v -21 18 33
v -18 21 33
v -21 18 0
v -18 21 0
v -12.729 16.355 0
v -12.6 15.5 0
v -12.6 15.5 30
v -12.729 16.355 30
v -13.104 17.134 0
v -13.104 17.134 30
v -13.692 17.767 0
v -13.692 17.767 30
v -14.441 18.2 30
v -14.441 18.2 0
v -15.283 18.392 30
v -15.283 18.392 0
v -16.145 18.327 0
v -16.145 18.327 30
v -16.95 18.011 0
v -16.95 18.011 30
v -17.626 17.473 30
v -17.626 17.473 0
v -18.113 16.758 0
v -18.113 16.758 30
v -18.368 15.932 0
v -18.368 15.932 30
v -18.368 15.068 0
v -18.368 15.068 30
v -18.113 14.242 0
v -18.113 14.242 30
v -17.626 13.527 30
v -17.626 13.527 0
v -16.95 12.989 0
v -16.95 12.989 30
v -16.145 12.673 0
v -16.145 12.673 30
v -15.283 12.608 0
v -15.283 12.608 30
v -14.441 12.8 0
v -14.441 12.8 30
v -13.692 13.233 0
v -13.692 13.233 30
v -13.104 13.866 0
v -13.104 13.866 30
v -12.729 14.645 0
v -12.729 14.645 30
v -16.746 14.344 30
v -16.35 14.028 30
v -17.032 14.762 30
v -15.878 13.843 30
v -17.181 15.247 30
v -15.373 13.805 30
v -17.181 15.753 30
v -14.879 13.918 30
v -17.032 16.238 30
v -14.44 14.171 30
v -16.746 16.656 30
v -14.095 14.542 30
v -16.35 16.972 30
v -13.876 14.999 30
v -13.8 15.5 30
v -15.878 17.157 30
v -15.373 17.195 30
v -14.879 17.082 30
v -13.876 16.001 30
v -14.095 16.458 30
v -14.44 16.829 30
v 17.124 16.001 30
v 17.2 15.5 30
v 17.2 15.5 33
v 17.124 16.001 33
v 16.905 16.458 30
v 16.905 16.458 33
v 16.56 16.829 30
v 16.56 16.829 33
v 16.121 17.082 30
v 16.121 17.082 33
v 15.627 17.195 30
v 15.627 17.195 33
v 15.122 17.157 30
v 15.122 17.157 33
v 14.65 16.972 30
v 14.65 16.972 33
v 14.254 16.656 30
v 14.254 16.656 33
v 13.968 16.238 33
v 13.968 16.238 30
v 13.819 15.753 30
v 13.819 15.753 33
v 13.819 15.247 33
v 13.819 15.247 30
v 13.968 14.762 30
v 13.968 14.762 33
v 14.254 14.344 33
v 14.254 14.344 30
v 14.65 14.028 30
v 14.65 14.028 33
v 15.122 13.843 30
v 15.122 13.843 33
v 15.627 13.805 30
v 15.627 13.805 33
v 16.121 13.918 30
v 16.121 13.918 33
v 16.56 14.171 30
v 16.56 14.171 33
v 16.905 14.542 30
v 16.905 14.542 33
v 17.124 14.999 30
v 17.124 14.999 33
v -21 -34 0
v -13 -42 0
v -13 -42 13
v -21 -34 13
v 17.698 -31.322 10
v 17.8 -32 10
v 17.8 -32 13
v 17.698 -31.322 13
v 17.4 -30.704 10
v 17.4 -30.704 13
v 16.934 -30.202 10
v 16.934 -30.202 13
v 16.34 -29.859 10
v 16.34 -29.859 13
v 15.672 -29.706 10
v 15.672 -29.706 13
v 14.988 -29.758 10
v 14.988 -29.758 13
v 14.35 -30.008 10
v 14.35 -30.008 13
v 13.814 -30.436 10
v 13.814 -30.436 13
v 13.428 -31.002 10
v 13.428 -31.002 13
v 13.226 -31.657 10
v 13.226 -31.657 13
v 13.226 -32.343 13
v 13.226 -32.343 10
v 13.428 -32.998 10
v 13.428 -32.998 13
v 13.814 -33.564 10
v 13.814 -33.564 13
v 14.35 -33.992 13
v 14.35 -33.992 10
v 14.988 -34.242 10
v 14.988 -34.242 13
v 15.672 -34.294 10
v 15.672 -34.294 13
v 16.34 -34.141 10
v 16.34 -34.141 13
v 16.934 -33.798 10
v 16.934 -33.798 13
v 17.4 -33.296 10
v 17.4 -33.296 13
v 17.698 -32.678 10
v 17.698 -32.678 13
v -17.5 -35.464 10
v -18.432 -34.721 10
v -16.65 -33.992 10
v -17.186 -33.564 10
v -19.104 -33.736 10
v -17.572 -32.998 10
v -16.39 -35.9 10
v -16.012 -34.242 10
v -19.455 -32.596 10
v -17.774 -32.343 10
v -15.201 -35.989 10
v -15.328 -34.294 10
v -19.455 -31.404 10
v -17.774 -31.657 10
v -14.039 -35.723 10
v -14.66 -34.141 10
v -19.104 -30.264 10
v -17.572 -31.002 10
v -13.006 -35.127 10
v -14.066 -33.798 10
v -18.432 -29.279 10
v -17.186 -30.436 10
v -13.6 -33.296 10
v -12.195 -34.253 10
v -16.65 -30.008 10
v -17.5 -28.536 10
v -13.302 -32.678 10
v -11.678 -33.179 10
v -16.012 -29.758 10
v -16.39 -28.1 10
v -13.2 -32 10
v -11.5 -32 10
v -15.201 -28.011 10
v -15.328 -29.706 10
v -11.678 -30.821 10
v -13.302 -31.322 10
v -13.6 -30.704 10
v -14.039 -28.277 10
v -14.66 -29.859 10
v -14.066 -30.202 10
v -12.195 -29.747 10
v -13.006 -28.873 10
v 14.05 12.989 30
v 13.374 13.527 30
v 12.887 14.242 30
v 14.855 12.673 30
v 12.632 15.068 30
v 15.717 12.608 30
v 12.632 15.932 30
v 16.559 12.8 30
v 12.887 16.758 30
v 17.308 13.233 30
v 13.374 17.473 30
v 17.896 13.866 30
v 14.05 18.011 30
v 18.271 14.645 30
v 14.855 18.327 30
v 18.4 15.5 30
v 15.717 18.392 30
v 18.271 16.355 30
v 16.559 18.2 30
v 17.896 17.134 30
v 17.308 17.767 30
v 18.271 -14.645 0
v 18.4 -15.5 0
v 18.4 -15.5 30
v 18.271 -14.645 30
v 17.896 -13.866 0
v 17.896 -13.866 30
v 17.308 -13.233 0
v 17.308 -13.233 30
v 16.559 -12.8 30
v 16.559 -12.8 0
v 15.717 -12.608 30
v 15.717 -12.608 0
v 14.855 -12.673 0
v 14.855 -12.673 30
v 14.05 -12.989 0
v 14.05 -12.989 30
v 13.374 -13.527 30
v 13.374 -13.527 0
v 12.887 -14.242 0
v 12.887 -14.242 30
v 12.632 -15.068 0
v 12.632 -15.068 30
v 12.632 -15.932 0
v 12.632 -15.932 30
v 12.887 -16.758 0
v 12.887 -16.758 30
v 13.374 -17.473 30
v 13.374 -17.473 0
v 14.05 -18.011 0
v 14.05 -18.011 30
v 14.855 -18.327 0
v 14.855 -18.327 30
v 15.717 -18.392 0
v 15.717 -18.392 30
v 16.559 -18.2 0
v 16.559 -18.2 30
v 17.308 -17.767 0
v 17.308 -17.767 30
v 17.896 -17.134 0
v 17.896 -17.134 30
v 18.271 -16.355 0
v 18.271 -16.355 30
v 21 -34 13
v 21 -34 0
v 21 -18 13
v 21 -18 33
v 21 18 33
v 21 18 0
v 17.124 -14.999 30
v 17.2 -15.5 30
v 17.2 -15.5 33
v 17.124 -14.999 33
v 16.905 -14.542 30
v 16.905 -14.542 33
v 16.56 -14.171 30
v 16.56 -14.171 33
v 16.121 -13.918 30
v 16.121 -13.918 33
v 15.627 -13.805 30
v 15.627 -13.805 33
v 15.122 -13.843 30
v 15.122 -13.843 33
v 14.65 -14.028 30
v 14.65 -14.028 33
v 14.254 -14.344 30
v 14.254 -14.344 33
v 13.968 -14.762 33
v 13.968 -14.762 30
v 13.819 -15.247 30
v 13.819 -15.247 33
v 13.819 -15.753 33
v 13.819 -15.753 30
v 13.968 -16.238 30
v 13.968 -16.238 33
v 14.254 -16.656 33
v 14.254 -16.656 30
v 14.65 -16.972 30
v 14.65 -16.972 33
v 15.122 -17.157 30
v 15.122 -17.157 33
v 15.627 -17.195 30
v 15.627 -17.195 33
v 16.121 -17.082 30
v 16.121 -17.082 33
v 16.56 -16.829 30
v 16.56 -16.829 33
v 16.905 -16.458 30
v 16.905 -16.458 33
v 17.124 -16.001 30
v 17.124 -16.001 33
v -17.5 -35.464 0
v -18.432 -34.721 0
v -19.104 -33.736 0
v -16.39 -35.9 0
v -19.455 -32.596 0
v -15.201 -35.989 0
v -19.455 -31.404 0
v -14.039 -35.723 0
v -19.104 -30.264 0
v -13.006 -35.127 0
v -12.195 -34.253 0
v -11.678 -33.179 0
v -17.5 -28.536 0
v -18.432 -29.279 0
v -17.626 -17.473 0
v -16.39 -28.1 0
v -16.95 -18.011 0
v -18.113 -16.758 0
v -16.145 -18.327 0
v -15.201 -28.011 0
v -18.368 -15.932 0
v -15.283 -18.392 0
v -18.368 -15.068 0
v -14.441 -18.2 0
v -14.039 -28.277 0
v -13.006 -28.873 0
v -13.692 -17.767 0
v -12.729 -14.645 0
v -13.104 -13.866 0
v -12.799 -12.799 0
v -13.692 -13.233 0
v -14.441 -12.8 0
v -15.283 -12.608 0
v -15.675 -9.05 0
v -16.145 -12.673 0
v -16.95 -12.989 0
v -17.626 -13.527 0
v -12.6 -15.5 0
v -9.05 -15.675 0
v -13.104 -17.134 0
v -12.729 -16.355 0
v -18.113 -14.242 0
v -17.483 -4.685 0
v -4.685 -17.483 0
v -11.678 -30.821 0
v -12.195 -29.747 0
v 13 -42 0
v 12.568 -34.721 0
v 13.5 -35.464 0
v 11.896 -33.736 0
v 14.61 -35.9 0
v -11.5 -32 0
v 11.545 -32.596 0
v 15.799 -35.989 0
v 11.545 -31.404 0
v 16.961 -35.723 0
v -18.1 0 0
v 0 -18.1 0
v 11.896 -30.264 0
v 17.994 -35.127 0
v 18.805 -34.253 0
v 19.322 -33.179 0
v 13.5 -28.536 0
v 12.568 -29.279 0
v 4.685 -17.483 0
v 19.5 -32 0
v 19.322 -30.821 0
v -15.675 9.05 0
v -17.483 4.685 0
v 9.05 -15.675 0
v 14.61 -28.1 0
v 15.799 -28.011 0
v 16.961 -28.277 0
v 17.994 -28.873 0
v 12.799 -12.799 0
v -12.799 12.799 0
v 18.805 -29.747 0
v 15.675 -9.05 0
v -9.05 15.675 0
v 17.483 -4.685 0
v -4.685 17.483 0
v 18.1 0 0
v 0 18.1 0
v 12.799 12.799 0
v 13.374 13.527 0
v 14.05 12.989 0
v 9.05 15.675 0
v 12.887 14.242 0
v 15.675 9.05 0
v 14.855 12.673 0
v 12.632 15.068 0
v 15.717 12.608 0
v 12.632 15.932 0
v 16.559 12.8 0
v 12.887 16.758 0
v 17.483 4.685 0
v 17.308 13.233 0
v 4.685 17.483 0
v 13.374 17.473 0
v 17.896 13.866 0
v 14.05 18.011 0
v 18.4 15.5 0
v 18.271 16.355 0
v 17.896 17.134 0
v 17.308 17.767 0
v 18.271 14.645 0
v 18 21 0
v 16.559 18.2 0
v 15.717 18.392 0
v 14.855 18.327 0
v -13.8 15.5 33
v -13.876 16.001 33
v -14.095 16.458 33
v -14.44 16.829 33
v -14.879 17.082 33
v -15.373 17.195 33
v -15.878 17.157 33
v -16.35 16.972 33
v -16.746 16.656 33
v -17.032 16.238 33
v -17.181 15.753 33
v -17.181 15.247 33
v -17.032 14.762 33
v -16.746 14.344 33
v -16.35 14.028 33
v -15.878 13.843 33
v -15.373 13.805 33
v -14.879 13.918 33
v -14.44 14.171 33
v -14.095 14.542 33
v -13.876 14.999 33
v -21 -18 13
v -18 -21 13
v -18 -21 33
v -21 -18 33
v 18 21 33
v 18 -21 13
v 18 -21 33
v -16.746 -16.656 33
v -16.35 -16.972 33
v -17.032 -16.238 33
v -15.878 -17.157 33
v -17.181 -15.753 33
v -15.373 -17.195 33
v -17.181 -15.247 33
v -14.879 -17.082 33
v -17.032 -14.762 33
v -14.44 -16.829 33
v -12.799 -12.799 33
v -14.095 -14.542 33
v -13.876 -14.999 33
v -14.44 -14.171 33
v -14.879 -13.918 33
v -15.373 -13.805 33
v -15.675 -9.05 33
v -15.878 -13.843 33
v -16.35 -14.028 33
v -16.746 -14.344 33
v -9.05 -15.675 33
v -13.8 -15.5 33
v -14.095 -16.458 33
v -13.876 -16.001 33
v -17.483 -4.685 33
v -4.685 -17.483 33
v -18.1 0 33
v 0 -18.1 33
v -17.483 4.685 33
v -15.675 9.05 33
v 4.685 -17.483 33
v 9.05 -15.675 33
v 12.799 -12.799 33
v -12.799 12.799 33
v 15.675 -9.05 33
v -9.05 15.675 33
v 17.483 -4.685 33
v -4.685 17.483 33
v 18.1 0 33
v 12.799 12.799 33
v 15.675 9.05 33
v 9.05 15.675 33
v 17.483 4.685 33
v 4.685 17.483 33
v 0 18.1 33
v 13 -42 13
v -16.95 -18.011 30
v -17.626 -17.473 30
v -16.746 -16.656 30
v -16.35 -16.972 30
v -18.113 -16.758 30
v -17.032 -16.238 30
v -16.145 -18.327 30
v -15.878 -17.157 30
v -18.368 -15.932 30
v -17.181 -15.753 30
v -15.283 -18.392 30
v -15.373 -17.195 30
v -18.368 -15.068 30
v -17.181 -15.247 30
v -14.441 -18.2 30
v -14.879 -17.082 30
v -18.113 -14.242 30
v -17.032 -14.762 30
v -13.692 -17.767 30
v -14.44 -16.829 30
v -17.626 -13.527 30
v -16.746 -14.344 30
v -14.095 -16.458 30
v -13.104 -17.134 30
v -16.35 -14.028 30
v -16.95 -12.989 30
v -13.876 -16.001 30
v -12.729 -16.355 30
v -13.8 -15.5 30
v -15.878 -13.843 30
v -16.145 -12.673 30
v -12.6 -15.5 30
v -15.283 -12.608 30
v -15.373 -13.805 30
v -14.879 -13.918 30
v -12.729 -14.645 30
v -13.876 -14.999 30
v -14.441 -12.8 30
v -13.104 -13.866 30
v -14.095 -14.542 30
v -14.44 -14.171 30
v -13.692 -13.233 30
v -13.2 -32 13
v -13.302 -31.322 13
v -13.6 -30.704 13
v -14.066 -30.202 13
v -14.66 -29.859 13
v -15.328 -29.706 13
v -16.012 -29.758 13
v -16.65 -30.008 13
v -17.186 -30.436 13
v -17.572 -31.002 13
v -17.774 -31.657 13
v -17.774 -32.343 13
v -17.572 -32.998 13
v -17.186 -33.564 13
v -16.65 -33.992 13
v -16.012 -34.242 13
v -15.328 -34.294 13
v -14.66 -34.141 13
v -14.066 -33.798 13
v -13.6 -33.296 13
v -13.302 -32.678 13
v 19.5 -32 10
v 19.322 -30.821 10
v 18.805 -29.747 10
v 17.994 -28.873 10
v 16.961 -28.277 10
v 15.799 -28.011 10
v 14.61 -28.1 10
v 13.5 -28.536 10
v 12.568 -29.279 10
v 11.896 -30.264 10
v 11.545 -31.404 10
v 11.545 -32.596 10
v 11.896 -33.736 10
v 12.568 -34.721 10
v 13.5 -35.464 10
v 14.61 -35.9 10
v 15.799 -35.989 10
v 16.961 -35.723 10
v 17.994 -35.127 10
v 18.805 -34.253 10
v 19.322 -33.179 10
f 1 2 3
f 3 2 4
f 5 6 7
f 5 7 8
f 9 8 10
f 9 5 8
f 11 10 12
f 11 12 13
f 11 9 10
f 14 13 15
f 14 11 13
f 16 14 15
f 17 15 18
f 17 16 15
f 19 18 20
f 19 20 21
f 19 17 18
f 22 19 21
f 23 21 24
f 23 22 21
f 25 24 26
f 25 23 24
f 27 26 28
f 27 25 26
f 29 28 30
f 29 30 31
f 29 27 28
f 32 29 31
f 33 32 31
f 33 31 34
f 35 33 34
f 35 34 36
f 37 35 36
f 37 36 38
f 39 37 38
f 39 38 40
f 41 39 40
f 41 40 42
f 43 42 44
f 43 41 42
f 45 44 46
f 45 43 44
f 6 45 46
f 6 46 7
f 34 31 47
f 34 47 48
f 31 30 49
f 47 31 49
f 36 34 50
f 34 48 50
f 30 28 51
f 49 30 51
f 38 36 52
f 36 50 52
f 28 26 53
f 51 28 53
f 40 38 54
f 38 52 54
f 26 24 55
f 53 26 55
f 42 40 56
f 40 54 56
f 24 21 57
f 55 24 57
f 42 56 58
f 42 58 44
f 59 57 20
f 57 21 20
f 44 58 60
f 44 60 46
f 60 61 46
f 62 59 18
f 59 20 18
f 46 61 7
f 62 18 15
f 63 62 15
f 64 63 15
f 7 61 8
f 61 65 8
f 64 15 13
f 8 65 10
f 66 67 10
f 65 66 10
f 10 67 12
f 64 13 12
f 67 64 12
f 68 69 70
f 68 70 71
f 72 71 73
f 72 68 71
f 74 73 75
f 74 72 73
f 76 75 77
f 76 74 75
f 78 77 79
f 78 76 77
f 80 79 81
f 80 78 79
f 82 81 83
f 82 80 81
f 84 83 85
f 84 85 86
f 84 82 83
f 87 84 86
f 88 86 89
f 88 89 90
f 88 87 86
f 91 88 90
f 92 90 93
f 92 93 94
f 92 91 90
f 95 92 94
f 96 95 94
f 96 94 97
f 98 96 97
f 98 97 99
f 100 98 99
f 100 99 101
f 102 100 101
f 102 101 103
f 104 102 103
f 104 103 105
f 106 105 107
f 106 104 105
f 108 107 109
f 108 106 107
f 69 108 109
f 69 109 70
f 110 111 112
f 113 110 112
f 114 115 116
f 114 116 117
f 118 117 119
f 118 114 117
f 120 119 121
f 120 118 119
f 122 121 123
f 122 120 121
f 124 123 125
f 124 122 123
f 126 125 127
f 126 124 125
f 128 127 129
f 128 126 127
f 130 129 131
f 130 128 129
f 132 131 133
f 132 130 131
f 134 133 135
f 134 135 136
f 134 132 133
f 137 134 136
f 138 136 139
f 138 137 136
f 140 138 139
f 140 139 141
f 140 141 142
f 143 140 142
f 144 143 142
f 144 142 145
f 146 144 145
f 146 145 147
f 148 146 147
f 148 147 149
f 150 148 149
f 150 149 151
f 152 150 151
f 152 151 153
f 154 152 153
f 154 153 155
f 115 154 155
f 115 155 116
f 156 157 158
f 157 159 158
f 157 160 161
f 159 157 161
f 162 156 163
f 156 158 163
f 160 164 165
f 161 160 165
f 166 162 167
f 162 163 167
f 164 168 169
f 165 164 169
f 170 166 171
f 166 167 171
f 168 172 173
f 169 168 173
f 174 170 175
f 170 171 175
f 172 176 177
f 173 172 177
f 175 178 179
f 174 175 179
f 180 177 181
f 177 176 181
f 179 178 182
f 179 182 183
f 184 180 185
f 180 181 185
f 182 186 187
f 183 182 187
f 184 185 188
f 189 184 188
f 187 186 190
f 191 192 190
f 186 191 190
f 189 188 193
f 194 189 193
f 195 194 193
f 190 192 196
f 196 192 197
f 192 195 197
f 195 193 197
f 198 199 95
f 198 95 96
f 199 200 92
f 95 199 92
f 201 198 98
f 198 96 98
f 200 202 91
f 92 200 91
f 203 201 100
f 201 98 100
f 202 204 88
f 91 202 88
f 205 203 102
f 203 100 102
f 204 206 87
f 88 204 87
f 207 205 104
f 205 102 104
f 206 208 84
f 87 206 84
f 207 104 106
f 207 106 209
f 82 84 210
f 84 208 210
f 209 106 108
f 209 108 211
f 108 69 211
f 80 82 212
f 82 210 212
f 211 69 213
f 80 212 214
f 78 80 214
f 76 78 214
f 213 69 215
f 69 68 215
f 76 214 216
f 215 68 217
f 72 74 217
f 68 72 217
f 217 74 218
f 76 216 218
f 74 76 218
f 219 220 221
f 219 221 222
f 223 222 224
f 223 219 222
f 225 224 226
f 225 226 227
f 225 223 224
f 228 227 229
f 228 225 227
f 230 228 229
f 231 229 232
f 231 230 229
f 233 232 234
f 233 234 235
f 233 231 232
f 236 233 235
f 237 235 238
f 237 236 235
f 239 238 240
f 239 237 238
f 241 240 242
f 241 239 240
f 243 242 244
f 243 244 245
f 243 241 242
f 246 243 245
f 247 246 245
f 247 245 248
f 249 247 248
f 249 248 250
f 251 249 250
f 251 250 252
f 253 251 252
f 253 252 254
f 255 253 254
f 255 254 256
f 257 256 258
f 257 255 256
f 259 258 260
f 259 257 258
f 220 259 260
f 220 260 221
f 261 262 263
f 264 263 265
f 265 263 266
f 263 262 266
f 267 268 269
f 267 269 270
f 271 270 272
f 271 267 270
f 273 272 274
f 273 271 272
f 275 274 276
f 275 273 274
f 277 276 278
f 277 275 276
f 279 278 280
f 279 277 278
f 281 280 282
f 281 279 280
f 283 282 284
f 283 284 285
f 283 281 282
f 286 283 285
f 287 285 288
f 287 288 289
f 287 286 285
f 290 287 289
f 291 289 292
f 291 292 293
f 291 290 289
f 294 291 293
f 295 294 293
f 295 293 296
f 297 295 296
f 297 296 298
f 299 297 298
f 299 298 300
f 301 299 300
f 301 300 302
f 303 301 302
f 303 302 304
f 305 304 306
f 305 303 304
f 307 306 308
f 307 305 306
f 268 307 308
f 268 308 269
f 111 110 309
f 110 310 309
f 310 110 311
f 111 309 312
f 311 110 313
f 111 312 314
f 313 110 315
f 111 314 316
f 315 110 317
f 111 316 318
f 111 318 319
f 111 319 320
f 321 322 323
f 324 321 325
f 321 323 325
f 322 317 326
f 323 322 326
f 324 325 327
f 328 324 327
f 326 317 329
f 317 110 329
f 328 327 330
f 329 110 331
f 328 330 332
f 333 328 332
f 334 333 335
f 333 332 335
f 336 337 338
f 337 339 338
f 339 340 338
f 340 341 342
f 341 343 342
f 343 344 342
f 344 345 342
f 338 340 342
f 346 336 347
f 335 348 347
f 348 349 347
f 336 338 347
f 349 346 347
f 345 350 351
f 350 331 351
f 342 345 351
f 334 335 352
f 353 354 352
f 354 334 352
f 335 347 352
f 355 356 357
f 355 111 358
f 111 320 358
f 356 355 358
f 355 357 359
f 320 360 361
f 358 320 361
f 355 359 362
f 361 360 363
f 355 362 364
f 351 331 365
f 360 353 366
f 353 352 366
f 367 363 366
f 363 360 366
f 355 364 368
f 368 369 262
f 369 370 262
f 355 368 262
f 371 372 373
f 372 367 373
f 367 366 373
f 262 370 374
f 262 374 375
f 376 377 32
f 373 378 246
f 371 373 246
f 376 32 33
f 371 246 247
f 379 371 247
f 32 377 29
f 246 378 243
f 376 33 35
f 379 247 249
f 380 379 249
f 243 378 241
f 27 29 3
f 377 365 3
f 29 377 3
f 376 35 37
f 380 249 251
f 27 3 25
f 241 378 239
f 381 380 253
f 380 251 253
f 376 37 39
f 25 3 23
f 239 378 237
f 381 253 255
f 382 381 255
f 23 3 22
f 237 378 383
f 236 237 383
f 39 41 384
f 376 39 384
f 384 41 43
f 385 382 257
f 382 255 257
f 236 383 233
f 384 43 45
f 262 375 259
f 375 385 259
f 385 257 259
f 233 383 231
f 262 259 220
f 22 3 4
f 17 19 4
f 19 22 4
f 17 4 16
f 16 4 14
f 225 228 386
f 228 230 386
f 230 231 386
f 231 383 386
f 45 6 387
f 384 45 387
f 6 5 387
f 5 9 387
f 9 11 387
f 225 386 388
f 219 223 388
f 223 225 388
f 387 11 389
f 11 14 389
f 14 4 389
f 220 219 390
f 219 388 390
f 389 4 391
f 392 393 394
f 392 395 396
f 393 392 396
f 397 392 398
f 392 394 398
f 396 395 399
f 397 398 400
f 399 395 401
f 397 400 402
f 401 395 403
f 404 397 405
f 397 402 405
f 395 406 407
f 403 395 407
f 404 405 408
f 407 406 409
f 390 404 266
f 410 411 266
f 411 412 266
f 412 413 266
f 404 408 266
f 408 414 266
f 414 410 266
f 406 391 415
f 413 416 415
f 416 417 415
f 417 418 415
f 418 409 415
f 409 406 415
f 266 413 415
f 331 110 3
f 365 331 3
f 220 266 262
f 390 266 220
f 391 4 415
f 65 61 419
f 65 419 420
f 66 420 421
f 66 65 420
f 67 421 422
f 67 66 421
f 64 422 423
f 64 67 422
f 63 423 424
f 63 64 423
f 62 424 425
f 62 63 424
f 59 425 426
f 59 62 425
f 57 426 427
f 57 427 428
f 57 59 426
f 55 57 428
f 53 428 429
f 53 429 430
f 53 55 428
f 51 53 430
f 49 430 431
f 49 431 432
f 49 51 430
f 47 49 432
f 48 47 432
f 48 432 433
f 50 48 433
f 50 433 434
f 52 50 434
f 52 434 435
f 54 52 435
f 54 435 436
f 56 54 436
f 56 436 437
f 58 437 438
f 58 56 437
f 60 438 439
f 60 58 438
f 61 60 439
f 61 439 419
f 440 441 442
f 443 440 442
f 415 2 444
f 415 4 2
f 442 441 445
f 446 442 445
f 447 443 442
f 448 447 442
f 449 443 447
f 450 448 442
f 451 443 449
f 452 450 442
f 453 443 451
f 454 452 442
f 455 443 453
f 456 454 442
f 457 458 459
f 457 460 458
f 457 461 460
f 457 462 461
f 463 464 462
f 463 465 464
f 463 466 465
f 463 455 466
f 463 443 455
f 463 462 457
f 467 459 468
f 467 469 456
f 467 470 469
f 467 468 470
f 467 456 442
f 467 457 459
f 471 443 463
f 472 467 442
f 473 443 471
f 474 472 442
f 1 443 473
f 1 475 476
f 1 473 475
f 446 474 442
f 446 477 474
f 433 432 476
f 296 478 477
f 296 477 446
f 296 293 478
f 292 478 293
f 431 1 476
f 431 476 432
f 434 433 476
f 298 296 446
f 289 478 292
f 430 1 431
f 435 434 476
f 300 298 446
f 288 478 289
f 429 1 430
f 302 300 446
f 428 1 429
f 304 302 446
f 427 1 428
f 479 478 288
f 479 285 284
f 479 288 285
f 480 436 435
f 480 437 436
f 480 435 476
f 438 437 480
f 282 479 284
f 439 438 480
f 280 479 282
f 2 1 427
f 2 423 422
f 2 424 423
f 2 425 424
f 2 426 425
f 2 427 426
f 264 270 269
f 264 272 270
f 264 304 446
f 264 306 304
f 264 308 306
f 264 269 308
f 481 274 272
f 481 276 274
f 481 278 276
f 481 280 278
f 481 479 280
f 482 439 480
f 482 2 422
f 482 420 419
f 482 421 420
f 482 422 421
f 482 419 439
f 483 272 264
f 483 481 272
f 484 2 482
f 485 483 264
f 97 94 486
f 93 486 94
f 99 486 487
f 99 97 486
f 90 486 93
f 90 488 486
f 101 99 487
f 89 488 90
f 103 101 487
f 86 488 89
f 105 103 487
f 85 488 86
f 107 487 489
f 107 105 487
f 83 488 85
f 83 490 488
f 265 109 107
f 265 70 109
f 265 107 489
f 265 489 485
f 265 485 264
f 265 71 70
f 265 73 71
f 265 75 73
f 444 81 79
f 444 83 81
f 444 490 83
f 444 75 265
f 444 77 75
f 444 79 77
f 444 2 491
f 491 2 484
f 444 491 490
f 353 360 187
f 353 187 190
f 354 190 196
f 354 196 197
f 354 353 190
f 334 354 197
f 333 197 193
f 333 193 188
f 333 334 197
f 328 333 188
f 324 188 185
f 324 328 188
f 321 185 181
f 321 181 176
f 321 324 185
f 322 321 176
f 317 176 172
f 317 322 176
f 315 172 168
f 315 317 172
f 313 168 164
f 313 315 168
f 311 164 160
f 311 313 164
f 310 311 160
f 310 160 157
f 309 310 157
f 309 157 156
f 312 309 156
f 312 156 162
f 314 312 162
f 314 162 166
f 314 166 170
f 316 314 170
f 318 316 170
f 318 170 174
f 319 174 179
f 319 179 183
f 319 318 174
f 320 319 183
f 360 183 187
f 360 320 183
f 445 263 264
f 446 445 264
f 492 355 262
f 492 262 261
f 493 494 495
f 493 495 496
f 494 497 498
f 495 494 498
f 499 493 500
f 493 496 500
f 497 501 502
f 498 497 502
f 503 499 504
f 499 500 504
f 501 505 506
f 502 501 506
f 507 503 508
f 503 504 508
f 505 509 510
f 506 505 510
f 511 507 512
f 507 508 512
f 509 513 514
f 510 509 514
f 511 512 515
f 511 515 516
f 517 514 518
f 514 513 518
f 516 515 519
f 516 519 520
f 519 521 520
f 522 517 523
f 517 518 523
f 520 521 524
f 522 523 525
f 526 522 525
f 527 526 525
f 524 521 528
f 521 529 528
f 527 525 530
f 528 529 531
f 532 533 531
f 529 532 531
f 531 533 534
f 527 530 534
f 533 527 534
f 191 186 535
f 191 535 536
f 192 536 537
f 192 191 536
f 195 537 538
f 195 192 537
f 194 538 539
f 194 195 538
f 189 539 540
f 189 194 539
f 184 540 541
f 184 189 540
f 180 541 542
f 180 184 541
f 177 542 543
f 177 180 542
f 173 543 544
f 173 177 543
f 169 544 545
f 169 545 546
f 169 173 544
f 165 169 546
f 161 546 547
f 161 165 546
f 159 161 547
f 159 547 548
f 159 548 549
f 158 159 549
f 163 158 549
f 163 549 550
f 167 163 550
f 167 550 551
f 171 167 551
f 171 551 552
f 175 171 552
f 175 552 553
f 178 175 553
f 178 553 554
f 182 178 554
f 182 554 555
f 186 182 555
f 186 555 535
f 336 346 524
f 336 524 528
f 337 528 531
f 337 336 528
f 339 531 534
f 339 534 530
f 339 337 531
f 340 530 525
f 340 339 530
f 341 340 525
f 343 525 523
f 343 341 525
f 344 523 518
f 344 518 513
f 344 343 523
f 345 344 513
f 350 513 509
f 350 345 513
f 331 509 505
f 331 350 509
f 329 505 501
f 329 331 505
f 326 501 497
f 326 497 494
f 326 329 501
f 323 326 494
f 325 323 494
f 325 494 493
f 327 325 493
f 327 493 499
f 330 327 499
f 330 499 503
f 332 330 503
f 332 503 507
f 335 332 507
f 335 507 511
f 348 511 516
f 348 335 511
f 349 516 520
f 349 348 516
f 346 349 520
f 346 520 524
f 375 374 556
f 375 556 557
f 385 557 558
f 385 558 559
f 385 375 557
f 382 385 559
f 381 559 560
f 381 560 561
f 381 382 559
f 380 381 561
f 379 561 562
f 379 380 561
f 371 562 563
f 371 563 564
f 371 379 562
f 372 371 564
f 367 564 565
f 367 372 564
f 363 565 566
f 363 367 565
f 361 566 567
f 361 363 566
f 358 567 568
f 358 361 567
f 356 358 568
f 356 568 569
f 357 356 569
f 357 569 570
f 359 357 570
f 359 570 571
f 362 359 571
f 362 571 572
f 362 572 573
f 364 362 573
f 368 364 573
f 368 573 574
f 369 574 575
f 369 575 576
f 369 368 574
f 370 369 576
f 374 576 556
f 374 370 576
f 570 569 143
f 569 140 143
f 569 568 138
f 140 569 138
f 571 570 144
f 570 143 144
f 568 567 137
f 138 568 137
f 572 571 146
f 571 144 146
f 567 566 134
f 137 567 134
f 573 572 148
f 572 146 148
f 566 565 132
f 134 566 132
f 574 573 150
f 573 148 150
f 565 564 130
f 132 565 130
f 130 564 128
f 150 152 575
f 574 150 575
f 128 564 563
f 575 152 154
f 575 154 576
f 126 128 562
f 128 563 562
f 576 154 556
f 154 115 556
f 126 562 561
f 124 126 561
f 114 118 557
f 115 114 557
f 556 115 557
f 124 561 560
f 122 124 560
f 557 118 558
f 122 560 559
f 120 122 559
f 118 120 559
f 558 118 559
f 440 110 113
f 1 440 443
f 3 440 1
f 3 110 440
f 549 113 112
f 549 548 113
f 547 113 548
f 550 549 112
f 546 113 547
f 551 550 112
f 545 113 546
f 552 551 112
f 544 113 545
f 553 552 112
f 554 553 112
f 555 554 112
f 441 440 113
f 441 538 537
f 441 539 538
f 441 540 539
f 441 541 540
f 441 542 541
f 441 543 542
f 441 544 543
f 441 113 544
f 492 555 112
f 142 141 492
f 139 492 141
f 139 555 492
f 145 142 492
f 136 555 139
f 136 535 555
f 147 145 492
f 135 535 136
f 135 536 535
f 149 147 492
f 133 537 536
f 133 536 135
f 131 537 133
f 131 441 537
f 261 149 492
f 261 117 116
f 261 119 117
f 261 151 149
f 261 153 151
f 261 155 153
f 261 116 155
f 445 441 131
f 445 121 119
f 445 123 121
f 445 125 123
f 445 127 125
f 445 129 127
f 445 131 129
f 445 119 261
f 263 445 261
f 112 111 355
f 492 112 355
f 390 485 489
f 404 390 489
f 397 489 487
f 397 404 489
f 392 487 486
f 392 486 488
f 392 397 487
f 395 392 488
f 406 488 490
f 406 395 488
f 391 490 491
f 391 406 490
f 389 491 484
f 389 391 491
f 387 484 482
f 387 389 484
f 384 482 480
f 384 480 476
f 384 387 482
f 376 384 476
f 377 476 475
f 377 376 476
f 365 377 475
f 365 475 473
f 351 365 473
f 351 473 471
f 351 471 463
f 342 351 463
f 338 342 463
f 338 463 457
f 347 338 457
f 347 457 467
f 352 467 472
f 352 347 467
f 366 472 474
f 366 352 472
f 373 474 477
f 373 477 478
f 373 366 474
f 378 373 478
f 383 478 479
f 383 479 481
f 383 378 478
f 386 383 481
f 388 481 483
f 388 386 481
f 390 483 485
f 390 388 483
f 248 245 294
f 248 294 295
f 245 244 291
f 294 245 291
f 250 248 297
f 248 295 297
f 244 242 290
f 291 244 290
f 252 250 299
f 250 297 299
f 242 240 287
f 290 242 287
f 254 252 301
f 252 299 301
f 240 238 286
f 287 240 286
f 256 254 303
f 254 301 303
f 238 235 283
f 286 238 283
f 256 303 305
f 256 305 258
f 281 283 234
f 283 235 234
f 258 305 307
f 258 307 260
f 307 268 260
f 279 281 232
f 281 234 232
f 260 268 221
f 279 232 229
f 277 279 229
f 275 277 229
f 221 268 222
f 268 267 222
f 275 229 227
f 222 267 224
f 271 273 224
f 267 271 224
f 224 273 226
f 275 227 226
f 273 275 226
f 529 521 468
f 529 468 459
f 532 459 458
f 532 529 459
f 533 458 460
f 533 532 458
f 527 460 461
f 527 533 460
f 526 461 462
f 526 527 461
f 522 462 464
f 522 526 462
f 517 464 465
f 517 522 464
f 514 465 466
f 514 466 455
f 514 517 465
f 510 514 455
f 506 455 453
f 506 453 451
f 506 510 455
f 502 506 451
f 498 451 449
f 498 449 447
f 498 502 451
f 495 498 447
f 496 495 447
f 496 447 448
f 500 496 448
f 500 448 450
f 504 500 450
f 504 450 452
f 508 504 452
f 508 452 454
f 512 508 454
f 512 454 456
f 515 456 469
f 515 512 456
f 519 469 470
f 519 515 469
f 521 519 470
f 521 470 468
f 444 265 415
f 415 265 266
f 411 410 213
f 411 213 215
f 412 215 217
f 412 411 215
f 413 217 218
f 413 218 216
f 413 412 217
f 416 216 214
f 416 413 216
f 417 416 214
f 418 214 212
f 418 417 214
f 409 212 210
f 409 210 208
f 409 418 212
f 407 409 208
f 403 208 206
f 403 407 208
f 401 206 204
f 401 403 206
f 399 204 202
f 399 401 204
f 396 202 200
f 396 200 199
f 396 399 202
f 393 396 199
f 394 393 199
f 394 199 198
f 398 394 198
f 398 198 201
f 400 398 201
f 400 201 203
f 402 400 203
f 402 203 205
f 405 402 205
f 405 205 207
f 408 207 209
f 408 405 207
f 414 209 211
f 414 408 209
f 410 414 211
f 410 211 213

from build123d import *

# Parameters (mm, degrees)
SKIZZE1_W                       = 42
SKIZZE1_H                       = 63
SKIZZE1_R                       = 18.1
SKIZZE1_R_2                     = 1.7
SKIZZE1_R_3                     = 2.3
AUFSATZ_LINEAR_AUSTRAGEN1_DEPTH = 13
SKIZZE2_W                       = 42
SKIZZE2_H                       = 42
SKIZZE2_R                       = 18.1
SKIZZE2_R_2                     = 1.7
AUFSATZ_LINEAR_AUSTRAGEN2_DEPTH = 20
SKIZZE4_R                       = 4
SCHNITT_LINEAR_AUSTRAGEN1_DEPTH = 10
SKIZZE5_R                       = 2.9
SCHNITT_LINEAR_AUSTRAGEN2_DEPTH = 30
FASE1_SIZE                      = 3
FASE2_SIZE                      = 8


with BuildPart() as part:
    # Skizze1 → Aufsatz-Linear austragen1 (new body)
    with BuildSketch(Plane.XY):
        with Locations((0, -10.5)):
            Rectangle(SKIZZE1_W, SKIZZE1_H)
        Circle(SKIZZE1_R, mode=Mode.SUBTRACT)
        with Locations((-15.5, 15.5)):
            Circle(SKIZZE1_R_2, mode=Mode.SUBTRACT)
        with Locations((15.5, 15.5)):
            Circle(SKIZZE1_R_2, mode=Mode.SUBTRACT)
        with Locations((-15.5, -15.5)):
            Circle(SKIZZE1_R_2, mode=Mode.SUBTRACT)
        with Locations((15.5, -15.5)):
            Circle(SKIZZE1_R_2, mode=Mode.SUBTRACT)
        with Locations((-15.5, -32)):
            Circle(SKIZZE1_R_3, mode=Mode.SUBTRACT)
        with Locations((15.5, -32)):
            Circle(SKIZZE1_R_3, mode=Mode.SUBTRACT)
    extrude(amount=AUFSATZ_LINEAR_AUSTRAGEN1_DEPTH)

    # Skizze2 → Aufsatz-Linear austragen2 (add)
    with BuildSketch(Plane.XY.offset(13)):
        Rectangle(SKIZZE2_W, SKIZZE2_H)
        Circle(SKIZZE2_R, mode=Mode.SUBTRACT)
        with Locations((15.5, 15.5)):
            Circle(SKIZZE2_R_2, mode=Mode.SUBTRACT)
        with Locations((15.5, -15.5)):
            Circle(SKIZZE2_R_2, mode=Mode.SUBTRACT)
        with Locations((-15.5, -15.5)):
            Circle(SKIZZE2_R_2, mode=Mode.SUBTRACT)
        with Locations((-15.5, 15.5)):
            Circle(SKIZZE2_R_2, mode=Mode.SUBTRACT)
    extrude(amount=AUFSATZ_LINEAR_AUSTRAGEN2_DEPTH)

    # Skizze4 → Schnitt-Linear austragen1 (cut)
    with BuildSketch(Plane.XY):
        with Locations((-15.5, -32)):
            Circle(SKIZZE4_R)
        with Locations((15.5, -32)):
            Circle(SKIZZE4_R)
    extrude(amount=SCHNITT_LINEAR_AUSTRAGEN1_DEPTH, mode=Mode.SUBTRACT)

    # Skizze5 → Schnitt-Linear austragen2 (cut)
    with BuildSketch(Plane.XY):
        with Locations((-15.5, 15.5)):
            Circle(SKIZZE5_R)
        with Locations((15.5, 15.5)):
            Circle(SKIZZE5_R)
        with Locations((-15.5, -15.5)):
            Circle(SKIZZE5_R)
        with Locations((15.5, -15.5)):
            Circle(SKIZZE5_R)
    extrude(amount=SCHNITT_LINEAR_AUSTRAGEN2_DEPTH, mode=Mode.SUBTRACT)

    # Fase1
    fase1_edges = [part.edges().sort_by_distance(p)[0] for p in [
        (-21, -21, 23),
        (21, -21, 23),
        (-21, 21, 16.5),
        (21, 21, 16.5),
    ]]
    chamfer(fase1_edges, length=FASE1_SIZE)

    # Fase2
    fase2_edges = [part.edges().sort_by_distance(p)[0] for p in [
        (21, -42, 6.5),
        (-21, -42, 6.5),
    ]]
    chamfer(fase2_edges, length=FASE2_SIZE)


solid = part.part
